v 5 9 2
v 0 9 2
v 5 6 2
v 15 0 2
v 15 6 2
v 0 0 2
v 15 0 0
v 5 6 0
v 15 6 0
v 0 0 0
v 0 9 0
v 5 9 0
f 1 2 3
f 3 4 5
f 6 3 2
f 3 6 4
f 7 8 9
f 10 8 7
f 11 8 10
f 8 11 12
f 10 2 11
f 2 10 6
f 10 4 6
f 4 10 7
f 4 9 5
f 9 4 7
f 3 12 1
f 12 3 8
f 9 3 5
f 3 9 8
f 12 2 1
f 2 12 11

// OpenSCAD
translate([2.5, 1.5, 1.0]) color([0.6320656015278037, 0.0216193804206819, 0.2700784048715086]) cube([5, 3, 2], center=true);
translate([7.5, 1.5, 1.0]) color([0.6684886667173141, 0.0002532098932251925, 0.3984286079265319]) cube([5, 3, 2], center=true);
translate([12.5, 1.5, 1.0]) color([0.8905618085087551, 0.7099647178965433, 0.4445845492335537]) cube([5, 3, 2], center=true);
translate([2.5, 4.5, 1.0]) color([0.7465509493098265, 0.35382203223851694, 0.8712980207444939]) cube([5, 3, 2], center=true);
translate([7.5, 4.5, 1.0]) color([0.6725473918674463, 0.19603088941730495, 0.08525923665948931]) cube([5, 3, 2], center=true);
translate([12.5, 4.5, 1.0]) color([0.0704556688087915, 0.26248678792717994, 0.533638651221174]) cube([5, 3, 2], center=true);
translate([2.5, 7.5, 1.0]) color([0.11818482376773232, 0.8594532404023933, 0.8906989166138923]) cube([5, 3, 2], center=true);
